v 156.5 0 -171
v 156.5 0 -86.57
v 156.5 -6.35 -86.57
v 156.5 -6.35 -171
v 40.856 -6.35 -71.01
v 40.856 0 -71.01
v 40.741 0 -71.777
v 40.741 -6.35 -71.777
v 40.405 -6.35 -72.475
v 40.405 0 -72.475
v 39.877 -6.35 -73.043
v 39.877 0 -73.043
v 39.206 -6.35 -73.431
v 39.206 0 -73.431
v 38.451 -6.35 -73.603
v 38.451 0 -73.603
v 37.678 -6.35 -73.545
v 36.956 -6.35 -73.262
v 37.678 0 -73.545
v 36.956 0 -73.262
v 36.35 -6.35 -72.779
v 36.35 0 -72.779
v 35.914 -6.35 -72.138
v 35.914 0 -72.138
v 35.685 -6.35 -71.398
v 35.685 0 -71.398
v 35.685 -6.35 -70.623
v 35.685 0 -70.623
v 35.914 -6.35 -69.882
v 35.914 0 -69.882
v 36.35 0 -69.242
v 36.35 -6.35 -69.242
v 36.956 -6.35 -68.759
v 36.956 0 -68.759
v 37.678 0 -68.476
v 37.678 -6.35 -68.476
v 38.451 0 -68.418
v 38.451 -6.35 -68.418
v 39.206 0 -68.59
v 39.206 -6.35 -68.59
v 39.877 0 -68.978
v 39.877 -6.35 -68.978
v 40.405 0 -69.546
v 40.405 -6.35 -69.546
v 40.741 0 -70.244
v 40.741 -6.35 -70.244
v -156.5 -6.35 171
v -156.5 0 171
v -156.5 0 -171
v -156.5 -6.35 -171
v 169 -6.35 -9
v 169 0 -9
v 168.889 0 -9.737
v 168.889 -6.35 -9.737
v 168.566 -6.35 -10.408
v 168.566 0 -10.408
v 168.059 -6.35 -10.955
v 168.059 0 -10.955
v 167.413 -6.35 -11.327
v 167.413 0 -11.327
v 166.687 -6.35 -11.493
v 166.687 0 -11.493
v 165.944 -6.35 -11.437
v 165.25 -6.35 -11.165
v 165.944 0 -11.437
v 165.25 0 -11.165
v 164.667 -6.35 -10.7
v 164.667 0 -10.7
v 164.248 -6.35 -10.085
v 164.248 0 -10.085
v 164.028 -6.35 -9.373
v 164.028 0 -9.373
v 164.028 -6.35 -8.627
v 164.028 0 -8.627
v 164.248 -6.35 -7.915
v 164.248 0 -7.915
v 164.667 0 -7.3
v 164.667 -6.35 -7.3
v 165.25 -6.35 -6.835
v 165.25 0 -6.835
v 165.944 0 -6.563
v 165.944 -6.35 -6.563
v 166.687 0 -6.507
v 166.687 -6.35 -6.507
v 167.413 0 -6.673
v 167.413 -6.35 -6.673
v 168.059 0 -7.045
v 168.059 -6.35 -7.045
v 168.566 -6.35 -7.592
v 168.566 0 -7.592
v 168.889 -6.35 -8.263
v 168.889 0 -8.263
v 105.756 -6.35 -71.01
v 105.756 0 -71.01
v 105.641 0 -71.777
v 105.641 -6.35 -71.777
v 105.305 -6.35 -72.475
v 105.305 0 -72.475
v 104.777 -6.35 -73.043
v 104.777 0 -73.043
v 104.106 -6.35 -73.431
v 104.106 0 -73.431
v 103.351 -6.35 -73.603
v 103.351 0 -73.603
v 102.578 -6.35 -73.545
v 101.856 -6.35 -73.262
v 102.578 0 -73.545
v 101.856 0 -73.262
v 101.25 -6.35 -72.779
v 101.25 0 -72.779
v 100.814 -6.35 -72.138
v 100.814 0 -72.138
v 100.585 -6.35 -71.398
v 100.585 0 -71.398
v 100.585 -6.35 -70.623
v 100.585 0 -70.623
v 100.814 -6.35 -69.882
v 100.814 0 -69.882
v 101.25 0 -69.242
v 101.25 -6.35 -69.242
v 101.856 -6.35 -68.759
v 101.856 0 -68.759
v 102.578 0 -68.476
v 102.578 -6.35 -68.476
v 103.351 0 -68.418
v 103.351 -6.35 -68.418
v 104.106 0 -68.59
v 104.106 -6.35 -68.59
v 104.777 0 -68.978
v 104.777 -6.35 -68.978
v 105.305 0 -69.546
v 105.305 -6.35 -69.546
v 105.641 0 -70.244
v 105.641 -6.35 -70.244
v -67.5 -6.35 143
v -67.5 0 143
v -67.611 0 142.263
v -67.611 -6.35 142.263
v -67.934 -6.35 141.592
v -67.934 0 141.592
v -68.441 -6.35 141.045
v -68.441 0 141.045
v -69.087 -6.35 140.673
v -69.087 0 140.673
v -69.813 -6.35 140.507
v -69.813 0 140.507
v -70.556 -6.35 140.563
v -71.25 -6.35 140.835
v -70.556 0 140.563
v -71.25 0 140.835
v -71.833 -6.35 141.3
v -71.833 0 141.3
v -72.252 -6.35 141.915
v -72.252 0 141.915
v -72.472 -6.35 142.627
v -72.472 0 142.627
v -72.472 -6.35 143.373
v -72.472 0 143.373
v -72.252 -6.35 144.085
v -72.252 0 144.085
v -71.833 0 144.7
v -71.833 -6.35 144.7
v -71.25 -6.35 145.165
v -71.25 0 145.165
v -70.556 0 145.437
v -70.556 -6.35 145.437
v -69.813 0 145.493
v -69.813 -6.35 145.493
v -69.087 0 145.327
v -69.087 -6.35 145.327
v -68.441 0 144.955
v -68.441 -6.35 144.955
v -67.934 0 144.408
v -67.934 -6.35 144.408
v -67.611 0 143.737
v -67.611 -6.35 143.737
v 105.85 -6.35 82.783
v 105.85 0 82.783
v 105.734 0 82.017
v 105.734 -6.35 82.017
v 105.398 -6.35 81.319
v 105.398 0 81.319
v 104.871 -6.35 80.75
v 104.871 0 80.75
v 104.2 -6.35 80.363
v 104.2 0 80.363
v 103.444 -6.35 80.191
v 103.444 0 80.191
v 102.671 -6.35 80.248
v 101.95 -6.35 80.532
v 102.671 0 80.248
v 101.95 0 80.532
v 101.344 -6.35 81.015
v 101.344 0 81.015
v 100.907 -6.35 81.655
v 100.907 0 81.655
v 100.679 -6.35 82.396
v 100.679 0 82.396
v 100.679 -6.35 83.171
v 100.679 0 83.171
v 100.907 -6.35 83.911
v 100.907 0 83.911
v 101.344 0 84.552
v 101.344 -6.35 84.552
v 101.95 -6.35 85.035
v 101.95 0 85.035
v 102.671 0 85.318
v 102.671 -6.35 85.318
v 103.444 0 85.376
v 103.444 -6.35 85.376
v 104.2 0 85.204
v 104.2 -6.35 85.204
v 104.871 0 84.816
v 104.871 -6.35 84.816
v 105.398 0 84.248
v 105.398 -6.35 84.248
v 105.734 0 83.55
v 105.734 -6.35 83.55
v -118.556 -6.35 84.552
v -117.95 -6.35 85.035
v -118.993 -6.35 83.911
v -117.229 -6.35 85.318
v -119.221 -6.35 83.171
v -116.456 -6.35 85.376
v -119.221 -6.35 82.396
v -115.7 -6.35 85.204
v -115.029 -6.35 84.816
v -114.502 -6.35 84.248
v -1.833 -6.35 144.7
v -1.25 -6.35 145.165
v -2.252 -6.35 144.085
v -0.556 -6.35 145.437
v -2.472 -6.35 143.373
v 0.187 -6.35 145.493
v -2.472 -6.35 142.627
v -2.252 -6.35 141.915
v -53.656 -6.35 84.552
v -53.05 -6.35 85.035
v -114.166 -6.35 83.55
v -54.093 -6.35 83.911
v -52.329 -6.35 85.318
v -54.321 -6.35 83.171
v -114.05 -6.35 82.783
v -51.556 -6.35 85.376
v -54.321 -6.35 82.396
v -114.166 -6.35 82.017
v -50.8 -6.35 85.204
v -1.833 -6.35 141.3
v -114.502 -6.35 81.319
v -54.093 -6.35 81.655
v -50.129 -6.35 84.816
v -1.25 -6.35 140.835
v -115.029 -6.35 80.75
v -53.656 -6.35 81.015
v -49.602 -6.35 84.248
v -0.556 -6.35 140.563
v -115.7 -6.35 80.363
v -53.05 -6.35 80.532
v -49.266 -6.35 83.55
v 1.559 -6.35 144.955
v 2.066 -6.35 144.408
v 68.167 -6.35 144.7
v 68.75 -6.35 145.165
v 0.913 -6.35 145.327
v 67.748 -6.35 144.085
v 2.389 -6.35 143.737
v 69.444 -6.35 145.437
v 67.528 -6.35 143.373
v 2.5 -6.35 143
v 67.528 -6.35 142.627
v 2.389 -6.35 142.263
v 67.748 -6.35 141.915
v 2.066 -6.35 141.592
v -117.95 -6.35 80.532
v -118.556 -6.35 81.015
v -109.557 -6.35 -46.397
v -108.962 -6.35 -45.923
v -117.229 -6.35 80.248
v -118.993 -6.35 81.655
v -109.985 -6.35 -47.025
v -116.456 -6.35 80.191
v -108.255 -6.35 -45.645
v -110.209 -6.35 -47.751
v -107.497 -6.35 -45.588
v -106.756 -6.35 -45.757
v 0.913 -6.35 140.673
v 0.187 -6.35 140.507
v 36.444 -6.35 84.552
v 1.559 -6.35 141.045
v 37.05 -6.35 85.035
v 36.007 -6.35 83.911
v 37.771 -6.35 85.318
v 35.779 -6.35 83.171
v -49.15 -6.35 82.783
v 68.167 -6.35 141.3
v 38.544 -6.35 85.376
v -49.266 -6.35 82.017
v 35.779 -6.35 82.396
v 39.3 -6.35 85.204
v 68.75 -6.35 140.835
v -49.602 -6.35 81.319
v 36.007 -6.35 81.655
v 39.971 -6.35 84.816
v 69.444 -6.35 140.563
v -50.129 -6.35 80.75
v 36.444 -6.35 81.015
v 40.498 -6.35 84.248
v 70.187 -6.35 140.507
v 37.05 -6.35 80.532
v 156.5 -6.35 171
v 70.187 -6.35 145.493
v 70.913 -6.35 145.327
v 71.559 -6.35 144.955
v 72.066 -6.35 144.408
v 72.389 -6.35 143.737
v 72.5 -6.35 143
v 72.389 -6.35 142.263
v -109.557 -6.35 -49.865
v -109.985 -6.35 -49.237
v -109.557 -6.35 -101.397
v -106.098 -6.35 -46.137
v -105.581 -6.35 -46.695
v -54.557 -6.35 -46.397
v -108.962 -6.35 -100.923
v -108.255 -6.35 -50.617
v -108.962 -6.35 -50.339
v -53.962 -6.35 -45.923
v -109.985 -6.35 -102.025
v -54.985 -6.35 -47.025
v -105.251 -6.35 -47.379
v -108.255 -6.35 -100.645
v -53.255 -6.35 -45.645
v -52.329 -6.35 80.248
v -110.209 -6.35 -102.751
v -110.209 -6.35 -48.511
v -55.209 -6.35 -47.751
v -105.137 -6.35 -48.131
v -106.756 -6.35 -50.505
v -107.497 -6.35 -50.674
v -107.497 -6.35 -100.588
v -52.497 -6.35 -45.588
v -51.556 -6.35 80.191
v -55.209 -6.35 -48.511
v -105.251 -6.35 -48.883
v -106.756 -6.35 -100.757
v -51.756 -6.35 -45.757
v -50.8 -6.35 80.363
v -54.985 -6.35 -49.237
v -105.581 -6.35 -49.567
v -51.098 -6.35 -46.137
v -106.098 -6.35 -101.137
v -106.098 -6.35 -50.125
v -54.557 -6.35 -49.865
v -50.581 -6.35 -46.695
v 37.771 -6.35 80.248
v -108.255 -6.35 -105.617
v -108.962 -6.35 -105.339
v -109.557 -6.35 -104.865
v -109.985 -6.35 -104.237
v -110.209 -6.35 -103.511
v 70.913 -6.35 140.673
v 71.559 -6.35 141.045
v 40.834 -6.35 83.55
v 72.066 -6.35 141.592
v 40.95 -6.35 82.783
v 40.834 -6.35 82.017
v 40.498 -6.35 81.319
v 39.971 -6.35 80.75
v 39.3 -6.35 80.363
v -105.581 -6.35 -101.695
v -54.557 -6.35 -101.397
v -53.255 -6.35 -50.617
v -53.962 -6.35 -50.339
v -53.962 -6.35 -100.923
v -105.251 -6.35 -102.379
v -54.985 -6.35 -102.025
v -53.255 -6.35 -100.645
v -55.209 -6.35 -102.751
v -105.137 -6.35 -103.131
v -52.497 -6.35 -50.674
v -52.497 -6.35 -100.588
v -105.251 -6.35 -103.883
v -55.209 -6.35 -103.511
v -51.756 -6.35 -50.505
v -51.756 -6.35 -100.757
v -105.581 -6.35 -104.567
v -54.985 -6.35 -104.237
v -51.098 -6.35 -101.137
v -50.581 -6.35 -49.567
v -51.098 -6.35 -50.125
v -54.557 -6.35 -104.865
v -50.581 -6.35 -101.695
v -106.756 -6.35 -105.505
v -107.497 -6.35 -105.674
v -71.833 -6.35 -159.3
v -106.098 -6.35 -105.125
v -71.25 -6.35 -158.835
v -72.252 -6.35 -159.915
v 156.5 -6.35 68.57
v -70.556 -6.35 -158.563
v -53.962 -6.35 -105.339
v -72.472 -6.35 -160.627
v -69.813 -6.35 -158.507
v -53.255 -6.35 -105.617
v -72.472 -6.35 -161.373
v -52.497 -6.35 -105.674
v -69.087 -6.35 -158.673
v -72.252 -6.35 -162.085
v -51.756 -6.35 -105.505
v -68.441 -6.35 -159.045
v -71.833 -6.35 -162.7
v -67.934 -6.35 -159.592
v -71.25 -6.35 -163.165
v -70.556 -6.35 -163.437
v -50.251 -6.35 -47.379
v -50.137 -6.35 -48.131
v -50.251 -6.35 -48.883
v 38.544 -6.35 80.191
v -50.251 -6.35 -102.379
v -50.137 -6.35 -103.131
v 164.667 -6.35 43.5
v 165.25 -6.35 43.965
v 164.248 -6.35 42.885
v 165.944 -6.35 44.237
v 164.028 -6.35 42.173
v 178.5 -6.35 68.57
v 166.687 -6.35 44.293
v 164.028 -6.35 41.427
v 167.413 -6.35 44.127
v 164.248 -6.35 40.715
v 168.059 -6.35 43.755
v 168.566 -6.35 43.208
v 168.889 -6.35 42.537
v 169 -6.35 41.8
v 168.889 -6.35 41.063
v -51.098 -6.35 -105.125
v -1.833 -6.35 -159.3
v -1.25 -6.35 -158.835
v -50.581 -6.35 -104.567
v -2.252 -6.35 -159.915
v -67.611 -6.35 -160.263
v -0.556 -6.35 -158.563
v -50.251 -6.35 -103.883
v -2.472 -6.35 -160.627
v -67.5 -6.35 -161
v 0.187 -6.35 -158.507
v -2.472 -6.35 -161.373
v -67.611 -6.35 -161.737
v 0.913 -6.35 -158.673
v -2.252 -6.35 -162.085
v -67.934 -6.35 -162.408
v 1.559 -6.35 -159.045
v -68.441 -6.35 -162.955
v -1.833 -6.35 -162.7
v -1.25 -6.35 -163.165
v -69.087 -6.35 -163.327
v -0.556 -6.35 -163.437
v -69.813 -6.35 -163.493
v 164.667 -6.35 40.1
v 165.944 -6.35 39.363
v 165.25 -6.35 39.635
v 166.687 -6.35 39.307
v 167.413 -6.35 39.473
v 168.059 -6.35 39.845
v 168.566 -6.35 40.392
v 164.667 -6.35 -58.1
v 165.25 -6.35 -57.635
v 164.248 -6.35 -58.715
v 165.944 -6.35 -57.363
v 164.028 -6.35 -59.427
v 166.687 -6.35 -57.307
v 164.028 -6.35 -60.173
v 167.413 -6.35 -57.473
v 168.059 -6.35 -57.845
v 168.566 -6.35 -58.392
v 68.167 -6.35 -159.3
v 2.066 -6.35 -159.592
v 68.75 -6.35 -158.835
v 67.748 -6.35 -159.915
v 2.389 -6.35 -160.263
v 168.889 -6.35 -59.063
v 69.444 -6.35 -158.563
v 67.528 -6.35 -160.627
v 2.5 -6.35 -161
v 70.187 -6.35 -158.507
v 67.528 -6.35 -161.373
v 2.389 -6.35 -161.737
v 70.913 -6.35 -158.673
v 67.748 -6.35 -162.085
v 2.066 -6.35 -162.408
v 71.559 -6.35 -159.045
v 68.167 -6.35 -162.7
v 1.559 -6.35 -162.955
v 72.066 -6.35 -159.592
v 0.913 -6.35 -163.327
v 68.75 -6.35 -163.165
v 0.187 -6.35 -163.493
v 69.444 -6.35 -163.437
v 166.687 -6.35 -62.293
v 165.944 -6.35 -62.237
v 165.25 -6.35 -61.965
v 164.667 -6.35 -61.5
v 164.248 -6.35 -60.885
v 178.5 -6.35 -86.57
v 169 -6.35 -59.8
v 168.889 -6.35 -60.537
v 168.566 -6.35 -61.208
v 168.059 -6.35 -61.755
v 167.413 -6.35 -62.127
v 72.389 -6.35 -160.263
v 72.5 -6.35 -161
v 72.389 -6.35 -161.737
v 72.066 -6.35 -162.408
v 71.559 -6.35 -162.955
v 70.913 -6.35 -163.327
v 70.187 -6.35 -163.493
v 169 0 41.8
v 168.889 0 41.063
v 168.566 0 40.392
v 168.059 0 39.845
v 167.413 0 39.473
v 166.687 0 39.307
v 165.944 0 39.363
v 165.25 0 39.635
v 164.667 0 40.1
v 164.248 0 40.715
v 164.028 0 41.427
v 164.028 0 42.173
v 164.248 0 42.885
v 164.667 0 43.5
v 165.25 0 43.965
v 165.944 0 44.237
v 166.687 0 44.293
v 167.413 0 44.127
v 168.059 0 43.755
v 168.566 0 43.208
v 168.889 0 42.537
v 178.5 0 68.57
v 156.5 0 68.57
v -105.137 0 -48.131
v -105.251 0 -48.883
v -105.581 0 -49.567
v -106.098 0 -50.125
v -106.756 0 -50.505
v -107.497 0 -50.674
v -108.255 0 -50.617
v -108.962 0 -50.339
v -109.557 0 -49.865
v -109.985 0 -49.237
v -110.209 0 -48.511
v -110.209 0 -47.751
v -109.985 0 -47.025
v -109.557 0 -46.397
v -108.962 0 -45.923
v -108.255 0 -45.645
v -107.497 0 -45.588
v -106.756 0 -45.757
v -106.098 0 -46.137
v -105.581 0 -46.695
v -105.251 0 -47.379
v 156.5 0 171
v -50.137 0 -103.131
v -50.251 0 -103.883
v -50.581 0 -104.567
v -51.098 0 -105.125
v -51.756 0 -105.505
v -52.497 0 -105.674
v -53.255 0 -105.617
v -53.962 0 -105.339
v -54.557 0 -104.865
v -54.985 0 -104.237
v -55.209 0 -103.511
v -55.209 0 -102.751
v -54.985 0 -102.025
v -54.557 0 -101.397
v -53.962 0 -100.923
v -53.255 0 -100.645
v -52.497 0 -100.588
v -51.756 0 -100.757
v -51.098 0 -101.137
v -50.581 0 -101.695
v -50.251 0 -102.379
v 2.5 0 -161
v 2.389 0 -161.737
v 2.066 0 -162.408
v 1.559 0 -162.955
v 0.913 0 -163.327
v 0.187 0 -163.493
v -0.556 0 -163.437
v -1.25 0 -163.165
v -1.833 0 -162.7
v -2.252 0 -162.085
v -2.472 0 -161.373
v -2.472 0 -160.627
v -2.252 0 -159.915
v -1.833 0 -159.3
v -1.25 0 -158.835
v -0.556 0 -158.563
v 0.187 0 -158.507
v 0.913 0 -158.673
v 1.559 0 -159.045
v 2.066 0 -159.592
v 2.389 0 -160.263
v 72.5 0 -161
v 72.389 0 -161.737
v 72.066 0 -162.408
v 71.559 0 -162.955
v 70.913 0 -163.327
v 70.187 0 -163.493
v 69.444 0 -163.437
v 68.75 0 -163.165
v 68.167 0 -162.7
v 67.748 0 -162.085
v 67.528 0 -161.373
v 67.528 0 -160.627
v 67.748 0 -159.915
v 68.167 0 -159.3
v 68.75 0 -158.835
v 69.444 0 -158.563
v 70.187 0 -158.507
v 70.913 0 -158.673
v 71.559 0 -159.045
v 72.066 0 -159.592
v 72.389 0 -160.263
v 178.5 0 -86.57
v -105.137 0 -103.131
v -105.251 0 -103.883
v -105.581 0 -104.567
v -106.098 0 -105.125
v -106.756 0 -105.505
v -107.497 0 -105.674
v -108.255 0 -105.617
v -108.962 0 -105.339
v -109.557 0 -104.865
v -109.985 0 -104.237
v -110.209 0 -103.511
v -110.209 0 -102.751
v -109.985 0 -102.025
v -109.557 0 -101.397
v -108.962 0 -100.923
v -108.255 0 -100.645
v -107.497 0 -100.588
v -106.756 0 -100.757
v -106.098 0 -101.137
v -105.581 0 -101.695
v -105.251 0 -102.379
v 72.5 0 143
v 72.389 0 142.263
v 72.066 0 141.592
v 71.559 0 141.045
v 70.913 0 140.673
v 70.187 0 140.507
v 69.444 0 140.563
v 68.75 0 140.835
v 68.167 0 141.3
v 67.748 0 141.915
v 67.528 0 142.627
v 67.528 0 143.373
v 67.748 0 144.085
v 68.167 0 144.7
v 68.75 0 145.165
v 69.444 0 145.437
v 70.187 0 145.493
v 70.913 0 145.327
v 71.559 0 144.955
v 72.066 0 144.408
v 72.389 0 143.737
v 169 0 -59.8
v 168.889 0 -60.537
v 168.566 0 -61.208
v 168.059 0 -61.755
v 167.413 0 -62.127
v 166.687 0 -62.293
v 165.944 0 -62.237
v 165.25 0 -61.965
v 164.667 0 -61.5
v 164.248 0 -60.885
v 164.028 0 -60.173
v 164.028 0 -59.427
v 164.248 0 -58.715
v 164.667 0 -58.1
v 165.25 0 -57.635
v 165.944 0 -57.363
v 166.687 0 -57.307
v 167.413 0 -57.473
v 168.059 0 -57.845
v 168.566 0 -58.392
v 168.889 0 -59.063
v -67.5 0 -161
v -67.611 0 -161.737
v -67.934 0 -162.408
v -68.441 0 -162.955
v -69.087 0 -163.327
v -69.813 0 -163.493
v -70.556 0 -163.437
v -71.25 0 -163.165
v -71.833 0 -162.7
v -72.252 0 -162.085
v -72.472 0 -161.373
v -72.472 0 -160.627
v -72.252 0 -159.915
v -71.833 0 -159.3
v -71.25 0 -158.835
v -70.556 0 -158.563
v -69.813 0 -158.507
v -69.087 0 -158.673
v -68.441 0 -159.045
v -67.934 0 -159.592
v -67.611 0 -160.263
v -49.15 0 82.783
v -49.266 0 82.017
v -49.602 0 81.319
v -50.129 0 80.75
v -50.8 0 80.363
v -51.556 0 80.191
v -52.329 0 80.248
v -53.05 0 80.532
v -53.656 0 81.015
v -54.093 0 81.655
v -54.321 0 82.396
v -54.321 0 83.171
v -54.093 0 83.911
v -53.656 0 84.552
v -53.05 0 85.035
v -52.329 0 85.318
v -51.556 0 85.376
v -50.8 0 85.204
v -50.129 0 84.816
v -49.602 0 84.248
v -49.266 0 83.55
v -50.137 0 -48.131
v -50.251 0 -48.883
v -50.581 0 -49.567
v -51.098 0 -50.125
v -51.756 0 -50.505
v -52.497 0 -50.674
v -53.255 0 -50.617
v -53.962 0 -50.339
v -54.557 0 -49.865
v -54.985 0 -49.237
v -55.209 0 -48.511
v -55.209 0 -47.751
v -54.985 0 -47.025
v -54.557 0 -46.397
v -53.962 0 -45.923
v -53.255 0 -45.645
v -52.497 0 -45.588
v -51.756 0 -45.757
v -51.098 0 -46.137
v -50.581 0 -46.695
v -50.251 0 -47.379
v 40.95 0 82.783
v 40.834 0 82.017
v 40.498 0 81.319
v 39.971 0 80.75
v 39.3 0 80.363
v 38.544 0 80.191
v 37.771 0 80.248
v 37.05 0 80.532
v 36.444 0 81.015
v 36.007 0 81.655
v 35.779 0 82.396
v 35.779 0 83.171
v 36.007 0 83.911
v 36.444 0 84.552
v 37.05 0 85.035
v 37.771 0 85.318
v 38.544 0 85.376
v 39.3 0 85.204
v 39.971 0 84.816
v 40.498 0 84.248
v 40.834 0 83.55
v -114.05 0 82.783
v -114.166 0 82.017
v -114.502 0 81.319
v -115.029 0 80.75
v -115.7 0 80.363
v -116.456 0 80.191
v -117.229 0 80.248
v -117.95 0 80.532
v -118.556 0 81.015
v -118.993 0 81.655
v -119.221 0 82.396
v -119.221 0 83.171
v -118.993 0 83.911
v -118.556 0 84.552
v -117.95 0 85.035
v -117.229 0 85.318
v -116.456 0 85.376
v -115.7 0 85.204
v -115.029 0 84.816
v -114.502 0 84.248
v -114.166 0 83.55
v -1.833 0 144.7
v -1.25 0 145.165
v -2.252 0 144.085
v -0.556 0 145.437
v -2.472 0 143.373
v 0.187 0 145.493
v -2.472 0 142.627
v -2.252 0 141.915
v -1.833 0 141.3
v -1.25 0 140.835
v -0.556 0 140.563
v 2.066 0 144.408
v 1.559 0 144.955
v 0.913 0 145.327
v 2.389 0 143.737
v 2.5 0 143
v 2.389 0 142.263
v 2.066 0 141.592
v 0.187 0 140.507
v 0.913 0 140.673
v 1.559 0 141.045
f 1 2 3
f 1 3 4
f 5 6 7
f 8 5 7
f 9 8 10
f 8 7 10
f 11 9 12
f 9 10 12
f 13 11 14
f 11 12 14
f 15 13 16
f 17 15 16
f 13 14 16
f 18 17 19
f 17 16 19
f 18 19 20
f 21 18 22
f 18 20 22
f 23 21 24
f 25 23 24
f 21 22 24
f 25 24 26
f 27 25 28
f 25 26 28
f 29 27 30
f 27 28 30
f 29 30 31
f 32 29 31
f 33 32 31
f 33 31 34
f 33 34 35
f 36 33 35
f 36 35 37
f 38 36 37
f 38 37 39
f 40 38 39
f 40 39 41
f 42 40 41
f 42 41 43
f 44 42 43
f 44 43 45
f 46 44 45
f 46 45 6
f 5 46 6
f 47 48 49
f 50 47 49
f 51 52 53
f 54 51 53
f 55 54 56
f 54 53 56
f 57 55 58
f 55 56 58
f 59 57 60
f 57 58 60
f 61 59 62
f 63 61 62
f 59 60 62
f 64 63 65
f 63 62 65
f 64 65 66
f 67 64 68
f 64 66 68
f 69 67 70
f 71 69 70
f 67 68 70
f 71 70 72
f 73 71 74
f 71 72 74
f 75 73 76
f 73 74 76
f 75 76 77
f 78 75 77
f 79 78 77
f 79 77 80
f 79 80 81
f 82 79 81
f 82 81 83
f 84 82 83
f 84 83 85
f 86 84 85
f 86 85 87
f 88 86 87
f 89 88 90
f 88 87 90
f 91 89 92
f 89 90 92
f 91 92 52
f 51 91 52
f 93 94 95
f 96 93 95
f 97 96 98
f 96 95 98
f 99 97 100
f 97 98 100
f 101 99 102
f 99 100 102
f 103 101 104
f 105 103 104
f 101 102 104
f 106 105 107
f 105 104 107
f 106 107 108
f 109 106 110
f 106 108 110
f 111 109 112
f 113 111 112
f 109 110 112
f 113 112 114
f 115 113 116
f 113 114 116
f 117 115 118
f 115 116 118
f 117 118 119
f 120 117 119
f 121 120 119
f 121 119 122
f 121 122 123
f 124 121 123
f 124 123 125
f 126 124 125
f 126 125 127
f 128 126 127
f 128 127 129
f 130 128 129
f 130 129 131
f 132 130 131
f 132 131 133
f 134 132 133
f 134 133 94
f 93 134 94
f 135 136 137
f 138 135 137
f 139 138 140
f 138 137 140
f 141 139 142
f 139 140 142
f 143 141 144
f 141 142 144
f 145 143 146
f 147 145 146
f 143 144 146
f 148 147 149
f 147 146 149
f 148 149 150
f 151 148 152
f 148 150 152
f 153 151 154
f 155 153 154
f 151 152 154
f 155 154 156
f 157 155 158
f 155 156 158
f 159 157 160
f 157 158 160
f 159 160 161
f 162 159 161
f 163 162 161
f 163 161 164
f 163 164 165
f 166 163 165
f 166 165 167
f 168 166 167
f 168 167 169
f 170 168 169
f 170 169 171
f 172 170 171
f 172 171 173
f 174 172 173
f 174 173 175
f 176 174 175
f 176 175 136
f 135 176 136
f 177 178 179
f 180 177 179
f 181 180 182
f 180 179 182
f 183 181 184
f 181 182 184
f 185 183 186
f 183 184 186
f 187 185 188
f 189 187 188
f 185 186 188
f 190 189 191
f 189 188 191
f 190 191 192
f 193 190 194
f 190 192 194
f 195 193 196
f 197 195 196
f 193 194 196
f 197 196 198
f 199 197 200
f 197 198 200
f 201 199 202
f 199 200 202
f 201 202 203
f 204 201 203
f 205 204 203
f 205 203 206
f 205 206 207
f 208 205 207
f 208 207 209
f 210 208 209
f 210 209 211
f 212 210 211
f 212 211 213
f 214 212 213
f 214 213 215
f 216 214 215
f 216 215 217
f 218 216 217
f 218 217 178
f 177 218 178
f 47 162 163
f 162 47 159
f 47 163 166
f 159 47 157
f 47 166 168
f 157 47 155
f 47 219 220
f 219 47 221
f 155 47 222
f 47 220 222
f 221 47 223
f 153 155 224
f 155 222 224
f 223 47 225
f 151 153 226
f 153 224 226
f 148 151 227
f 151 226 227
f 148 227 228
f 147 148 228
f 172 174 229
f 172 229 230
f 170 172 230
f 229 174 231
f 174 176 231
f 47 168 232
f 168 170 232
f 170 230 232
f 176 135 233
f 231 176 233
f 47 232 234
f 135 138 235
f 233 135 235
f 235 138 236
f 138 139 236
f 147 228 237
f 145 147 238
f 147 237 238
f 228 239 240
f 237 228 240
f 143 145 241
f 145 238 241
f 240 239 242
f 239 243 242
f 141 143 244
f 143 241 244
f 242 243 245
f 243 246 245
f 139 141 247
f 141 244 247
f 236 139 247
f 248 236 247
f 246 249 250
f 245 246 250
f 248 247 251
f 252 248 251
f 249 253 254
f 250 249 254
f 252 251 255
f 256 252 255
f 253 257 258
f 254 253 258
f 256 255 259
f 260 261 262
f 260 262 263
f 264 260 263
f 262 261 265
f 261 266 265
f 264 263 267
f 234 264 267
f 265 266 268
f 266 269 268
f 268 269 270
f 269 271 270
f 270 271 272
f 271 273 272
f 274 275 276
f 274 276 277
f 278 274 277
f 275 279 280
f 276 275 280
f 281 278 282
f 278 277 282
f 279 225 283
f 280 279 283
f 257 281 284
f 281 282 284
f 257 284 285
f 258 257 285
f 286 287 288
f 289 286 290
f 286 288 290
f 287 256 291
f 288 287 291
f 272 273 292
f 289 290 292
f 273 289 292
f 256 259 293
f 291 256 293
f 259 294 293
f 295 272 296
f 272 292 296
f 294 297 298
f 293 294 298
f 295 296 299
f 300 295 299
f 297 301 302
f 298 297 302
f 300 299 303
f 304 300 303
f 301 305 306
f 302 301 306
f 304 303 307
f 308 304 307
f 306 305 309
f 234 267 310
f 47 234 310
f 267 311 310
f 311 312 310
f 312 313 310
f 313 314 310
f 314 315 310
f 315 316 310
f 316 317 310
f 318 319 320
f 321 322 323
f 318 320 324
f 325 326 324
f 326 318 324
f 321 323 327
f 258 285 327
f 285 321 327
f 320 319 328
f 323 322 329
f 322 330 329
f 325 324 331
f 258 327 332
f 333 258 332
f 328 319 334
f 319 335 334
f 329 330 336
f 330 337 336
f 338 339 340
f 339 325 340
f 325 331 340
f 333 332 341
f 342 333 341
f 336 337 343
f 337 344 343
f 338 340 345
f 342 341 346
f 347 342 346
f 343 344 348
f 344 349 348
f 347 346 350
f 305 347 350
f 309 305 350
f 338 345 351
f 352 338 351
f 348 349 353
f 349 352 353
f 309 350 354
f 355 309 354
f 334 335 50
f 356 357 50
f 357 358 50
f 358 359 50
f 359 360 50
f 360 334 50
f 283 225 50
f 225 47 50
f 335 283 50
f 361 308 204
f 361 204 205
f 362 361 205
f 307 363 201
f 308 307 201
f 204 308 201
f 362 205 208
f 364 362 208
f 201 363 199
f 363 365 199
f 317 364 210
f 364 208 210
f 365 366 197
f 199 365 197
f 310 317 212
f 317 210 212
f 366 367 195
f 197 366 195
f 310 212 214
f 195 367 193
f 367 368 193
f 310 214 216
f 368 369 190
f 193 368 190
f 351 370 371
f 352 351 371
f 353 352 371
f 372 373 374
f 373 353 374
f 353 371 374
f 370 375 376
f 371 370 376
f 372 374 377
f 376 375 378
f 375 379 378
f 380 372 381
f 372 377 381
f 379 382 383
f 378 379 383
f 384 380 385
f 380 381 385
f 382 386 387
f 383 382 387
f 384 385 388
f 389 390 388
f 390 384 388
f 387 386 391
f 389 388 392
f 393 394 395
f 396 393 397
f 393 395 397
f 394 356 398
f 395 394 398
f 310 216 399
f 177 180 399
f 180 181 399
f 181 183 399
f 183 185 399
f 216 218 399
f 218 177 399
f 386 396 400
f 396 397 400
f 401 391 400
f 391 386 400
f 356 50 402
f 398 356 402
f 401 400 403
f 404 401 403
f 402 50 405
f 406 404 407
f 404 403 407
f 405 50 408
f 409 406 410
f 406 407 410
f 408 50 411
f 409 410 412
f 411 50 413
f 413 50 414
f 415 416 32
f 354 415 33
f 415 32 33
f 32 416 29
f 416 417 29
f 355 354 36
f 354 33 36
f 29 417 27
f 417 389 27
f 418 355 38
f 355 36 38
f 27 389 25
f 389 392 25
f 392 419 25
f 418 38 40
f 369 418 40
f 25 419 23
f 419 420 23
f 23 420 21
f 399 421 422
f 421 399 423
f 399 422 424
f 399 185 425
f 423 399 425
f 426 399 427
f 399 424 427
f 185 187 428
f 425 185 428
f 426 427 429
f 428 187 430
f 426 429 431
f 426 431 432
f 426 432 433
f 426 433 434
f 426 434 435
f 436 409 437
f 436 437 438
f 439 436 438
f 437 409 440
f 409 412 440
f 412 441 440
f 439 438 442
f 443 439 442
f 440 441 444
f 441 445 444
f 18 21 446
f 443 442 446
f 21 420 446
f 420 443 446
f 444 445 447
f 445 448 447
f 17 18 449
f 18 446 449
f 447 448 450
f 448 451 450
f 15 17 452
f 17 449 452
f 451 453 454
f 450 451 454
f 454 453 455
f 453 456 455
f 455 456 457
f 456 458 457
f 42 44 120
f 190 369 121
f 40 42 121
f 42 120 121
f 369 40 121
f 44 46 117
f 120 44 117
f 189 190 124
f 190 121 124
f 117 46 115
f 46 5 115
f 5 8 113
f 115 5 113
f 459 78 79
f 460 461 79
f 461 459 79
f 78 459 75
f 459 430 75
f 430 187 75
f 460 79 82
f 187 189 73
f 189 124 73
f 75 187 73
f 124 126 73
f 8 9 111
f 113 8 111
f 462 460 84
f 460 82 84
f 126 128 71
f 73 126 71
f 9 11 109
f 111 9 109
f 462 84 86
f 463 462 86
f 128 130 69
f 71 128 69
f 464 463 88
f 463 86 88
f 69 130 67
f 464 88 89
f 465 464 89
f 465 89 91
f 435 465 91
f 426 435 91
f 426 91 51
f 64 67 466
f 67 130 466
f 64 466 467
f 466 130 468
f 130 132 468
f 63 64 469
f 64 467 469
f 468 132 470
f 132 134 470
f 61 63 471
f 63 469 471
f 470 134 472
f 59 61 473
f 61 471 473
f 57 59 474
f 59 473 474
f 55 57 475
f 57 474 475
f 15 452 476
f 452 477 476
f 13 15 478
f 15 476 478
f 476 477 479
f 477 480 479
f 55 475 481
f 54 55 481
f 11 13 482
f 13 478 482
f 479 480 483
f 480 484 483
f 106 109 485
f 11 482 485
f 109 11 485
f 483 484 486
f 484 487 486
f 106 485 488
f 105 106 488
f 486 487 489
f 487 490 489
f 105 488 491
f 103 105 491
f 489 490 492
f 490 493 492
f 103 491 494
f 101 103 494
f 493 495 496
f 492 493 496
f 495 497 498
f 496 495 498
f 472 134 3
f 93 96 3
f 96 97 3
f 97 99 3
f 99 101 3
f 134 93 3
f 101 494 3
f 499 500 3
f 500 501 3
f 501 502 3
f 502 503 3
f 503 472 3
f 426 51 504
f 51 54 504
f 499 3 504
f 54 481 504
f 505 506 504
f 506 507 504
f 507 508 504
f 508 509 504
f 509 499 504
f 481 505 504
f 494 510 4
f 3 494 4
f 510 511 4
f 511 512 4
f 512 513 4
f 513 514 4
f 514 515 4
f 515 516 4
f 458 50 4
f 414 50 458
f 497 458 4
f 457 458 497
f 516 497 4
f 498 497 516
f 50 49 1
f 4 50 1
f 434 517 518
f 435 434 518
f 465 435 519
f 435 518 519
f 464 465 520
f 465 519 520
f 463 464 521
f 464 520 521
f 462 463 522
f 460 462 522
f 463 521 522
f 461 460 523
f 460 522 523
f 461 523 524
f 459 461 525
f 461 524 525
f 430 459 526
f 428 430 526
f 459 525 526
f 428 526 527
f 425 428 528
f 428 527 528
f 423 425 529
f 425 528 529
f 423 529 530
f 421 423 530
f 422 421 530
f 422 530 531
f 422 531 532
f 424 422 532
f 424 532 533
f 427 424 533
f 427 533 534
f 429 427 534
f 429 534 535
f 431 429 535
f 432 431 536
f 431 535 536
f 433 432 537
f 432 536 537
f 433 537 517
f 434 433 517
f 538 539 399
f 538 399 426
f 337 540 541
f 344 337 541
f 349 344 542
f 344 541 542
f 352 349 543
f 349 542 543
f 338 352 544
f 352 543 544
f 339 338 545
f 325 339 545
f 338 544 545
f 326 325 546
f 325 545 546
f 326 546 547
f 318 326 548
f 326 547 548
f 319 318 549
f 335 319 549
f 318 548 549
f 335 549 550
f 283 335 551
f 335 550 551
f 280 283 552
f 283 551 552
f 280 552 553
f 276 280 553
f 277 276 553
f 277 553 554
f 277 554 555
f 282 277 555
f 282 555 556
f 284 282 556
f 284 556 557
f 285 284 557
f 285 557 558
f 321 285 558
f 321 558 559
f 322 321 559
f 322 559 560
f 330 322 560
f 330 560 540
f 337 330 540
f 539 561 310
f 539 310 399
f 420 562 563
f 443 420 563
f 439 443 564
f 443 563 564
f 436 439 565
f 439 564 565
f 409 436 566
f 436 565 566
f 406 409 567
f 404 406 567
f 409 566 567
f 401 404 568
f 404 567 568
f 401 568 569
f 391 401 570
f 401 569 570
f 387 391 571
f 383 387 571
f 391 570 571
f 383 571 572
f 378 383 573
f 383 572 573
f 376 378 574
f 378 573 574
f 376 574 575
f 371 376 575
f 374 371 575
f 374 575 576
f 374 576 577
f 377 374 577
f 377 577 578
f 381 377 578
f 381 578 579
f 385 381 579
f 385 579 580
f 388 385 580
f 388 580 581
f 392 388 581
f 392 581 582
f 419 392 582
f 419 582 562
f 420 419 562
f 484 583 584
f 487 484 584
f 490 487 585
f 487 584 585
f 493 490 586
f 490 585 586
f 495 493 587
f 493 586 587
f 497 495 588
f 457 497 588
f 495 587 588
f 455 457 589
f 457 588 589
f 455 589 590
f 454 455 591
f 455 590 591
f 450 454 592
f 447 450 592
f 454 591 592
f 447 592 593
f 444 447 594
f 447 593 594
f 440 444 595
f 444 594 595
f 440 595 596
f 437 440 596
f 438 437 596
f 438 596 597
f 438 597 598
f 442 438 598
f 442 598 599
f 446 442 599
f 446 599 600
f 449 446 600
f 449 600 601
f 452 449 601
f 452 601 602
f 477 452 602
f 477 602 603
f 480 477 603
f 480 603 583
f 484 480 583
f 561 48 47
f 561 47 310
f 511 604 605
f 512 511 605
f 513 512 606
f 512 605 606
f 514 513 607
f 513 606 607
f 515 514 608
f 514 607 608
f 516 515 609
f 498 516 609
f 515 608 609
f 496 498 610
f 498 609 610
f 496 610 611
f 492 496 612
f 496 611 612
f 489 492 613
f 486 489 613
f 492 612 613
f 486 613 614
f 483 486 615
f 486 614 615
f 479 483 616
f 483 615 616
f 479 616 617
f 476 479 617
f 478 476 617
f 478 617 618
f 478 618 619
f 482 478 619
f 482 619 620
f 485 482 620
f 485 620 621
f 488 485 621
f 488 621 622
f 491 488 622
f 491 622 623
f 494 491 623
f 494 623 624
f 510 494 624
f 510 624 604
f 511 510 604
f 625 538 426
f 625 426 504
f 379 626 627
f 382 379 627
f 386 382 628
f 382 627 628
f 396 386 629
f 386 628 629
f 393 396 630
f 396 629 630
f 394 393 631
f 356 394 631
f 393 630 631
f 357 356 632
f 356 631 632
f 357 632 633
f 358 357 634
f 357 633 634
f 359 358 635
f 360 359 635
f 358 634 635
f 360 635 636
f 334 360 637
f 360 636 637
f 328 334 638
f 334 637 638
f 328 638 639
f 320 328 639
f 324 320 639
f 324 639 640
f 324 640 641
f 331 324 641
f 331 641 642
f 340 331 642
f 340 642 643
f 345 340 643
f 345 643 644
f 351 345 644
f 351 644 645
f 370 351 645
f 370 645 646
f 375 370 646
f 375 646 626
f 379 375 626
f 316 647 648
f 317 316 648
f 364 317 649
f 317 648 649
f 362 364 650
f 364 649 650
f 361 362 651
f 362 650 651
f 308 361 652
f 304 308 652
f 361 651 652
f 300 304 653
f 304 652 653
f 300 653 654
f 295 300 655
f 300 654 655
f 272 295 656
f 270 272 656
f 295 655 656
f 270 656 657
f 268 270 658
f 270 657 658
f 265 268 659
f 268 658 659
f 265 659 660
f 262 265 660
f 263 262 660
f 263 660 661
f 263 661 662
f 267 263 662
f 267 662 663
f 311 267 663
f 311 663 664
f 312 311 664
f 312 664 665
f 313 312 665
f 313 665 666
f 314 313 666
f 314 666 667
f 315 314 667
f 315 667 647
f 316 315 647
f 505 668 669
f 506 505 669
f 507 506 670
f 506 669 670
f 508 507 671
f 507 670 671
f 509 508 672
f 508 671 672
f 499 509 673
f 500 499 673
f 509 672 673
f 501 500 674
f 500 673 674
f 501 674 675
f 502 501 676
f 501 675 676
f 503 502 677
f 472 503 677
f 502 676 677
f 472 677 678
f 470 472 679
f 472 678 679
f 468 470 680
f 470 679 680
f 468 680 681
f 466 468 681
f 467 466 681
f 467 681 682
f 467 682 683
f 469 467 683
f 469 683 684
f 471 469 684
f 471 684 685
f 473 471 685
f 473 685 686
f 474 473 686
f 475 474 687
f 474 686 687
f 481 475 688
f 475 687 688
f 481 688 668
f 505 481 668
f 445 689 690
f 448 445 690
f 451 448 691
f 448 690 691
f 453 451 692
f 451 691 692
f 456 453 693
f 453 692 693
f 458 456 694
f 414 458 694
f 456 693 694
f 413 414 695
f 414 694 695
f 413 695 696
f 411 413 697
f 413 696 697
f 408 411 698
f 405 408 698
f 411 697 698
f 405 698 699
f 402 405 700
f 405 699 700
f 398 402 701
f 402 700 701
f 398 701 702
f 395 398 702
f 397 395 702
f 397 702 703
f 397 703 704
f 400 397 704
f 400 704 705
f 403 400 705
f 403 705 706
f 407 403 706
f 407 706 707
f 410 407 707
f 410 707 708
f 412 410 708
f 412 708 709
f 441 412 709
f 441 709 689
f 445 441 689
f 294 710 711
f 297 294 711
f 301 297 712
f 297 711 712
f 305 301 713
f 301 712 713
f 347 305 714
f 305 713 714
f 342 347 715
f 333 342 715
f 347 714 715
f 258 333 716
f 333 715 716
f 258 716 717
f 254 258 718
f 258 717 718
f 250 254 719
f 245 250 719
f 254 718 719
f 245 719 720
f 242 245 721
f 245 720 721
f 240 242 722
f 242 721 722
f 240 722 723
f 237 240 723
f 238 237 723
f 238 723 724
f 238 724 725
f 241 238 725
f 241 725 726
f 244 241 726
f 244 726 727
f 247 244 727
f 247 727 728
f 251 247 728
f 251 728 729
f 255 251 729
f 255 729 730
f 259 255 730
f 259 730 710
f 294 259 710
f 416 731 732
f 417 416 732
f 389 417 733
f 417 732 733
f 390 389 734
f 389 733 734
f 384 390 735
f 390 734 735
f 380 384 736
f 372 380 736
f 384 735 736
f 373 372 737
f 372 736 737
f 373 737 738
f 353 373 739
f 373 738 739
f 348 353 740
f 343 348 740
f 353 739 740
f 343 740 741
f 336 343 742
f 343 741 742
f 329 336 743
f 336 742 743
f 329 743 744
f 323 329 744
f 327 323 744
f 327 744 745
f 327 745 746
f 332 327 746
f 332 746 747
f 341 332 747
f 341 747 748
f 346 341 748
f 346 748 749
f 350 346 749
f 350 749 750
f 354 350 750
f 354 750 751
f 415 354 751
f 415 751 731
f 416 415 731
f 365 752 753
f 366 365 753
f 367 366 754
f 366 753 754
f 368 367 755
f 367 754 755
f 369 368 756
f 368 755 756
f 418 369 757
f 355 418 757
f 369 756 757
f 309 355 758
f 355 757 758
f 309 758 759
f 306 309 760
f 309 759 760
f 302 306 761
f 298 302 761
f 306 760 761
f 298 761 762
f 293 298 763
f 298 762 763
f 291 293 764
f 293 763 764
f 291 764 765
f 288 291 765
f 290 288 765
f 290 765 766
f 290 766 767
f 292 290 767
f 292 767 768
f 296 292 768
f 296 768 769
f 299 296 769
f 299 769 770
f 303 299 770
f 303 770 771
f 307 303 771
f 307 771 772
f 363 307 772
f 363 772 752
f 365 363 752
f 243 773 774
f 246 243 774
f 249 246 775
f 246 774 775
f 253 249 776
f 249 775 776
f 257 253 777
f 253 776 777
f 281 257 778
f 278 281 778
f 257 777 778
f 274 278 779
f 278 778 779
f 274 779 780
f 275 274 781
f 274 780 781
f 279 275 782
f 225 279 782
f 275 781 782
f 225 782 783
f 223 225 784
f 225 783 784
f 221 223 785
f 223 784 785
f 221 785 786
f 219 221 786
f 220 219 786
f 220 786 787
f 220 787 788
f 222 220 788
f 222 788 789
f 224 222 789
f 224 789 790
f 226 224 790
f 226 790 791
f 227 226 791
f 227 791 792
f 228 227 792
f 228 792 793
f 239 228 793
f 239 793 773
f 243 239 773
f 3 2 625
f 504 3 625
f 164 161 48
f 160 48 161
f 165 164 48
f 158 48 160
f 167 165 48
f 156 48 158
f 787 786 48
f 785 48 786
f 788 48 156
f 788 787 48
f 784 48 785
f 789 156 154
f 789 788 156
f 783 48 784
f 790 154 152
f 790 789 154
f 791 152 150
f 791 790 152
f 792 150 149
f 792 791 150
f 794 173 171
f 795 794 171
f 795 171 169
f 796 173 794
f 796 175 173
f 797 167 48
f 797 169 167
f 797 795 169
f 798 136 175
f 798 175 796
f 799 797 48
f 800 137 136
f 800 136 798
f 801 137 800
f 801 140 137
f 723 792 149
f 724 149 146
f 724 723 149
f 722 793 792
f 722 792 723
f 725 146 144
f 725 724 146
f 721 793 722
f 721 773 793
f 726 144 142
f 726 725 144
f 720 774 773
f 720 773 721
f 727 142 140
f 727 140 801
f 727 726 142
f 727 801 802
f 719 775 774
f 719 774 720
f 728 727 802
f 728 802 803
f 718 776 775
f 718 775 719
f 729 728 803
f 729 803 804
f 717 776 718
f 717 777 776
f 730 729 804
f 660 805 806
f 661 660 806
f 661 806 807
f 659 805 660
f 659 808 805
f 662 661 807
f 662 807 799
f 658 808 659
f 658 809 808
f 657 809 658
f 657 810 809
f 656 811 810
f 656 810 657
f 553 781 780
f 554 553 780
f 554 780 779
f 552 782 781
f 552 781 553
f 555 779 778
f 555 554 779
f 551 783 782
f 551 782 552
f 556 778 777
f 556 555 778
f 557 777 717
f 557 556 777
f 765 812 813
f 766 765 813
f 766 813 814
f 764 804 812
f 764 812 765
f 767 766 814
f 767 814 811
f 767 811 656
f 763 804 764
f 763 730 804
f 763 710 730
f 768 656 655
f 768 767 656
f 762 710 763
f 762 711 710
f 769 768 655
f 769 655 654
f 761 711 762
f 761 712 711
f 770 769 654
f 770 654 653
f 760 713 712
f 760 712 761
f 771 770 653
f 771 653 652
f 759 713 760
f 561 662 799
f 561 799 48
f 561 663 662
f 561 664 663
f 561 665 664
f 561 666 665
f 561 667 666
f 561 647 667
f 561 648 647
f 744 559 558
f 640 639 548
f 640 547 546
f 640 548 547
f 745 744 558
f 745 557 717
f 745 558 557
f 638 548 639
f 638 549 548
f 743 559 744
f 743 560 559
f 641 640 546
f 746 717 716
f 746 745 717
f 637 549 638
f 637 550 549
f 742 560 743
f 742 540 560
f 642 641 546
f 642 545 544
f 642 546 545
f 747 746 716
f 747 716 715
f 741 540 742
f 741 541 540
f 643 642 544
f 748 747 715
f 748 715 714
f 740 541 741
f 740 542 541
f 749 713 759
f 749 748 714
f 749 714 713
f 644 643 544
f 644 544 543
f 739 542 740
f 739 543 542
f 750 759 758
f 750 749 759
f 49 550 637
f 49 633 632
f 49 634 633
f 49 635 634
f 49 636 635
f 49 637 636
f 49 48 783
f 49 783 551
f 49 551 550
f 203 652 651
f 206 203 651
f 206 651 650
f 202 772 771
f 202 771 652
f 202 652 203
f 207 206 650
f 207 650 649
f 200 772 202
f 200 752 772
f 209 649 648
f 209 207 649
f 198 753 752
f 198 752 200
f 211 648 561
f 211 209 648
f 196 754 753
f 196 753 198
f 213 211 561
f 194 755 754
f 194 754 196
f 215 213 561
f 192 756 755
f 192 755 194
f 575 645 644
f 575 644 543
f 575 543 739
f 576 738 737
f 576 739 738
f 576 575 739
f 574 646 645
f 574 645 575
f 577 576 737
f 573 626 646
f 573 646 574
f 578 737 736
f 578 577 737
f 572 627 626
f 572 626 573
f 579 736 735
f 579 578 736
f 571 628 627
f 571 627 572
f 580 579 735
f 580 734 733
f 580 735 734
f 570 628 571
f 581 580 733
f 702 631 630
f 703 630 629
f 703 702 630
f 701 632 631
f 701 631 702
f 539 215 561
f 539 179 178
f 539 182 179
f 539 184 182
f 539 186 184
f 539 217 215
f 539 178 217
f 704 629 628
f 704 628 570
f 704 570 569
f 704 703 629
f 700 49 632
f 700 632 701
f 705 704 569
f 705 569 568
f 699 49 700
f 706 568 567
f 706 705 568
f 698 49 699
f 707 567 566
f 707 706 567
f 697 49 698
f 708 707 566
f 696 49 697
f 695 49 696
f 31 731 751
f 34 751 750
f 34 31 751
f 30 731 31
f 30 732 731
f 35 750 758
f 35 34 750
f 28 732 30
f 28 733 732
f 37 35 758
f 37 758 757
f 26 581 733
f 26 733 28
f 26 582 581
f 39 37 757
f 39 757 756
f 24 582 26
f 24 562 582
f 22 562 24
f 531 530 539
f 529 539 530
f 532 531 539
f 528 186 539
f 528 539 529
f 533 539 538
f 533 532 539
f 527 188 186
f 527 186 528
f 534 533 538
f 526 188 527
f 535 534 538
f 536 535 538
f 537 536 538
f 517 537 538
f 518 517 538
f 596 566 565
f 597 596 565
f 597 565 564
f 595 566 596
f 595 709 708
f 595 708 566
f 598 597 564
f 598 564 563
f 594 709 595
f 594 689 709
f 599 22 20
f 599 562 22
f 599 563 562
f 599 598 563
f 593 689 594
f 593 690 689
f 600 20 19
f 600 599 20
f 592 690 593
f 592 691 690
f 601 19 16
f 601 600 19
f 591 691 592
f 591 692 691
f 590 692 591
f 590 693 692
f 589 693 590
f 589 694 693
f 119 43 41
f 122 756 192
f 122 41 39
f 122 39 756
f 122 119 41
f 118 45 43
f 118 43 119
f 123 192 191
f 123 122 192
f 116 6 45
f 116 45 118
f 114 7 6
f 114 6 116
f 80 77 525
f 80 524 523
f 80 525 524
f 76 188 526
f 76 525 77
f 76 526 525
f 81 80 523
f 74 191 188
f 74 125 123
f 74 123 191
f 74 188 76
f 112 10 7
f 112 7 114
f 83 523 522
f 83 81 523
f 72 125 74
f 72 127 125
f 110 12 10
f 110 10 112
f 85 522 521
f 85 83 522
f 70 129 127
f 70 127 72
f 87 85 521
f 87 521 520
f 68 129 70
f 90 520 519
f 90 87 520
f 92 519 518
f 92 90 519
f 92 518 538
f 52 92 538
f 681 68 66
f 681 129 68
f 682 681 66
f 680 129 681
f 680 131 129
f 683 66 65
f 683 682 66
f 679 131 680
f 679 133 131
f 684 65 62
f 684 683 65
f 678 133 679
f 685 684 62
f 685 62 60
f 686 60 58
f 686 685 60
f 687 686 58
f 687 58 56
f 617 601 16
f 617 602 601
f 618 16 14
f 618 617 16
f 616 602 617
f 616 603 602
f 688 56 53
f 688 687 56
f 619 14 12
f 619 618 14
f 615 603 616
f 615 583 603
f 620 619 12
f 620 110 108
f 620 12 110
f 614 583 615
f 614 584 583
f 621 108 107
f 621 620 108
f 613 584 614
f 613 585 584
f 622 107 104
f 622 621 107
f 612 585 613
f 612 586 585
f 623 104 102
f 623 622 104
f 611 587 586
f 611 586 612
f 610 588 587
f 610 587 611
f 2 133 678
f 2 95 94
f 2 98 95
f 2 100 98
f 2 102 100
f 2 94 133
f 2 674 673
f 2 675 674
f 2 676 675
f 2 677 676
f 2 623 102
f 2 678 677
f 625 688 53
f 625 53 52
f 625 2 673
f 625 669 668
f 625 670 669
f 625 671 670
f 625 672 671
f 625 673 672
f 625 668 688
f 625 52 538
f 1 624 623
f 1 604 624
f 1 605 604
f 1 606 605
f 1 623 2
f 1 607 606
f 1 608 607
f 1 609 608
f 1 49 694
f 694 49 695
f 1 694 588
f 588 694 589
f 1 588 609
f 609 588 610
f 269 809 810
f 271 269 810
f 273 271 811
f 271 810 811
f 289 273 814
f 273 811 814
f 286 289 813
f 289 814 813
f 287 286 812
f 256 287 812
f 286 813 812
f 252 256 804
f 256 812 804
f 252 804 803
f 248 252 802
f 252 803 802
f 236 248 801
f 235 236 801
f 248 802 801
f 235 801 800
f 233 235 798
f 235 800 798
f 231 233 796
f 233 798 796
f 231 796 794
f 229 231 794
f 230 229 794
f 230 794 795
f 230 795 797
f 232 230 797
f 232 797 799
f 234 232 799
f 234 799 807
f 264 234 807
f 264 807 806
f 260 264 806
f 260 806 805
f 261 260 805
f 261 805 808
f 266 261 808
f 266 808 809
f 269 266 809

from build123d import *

# Parameters (mm, degrees)
SKETCH1_W           = 313
SKETCH1_H           = 342
BOSS_EXTRUDE1_DEPTH = 6.35
SKETCH3_W           = 22
SKETCH3_H           = 155.14040353
SKETCH3_R           = 2.5
BOSS_EXTRUDE2_DEPTH = 6.35
SKETCH2_R           = 2.5
CUT_EXTRUDE1_DEPTH  = 7.35
SKETCH4_R           = 2.6
SKETCH4_R_2         = 2.55
CUT_EXTRUDE2_DEPTH  = 7.35


with BuildPart() as part:
    # Sketch1 → Boss-Extrude1 (new body)
    with BuildSketch(Plane(origin=(0, 0, 0), x_dir=(1, 0, 0), z_dir=(0, 1, 0))):
        Rectangle(SKETCH1_W, SKETCH1_H)
    extrude(amount=-BOSS_EXTRUDE1_DEPTH)

    # Sketch3 → Boss-Extrude2 (add)
    with BuildSketch(Plane(origin=(0, 0, 0), x_dir=(1, 0, 0), z_dir=(0, 1, 0))):
        with Locations((167.5, 9)):
            Rectangle(SKETCH3_W, SKETCH3_H)
        with Locations((166.5, 9)):
            Circle(SKETCH3_R, mode=Mode.SUBTRACT)
        with Locations((166.5, -41.8)):
            Circle(SKETCH3_R, mode=Mode.SUBTRACT)
        with Locations((166.5, 59.8)):
            Circle(SKETCH3_R, mode=Mode.SUBTRACT)
    extrude(amount=-BOSS_EXTRUDE2_DEPTH)

    # Sketch2 → Cut-Extrude1 (cut, through all)
    with BuildSketch(Plane(origin=(0, 0, 0), x_dir=(1, 0, 0), z_dir=(0, 1, 0))):
        with Locations((0, -143)):
            Circle(SKETCH2_R)
        with Locations((-70, -143)):
            Circle(SKETCH2_R)
        with Locations((70, -143)):
            Circle(SKETCH2_R)
        with Locations((-70, 161)):
            Circle(SKETCH2_R)
        with Locations((0, 161)):
            Circle(SKETCH2_R)
        with Locations((70, 161)):
            Circle(SKETCH2_R)
    extrude(amount=-CUT_EXTRUDE1_DEPTH, mode=Mode.SUBTRACT)

    # Sketch4 → Cut-Extrude2 (cut, through all)
    with BuildSketch(Plane(origin=(0, 0, 0), x_dir=(1, 0, 0), z_dir=(0, 1, 0))):
        with Locations((103.249710043, -82.783250091)):
            Circle(SKETCH4_R)
        with Locations((38.349710043, -82.783250091)):
            Circle(SKETCH4_R)
        with Locations((-51.750289957, -82.783250091)):
            Circle(SKETCH4_R)
        with Locations((-116.650289957, -82.783250091)):
            Circle(SKETCH4_R)
        with Locations((103.156346537, 71.010318364)):
            Circle(SKETCH4_R)
        with Locations((38.256346537, 71.010318364)):
            Circle(SKETCH4_R)
        with Locations((-52.687463488, 48.130966948)):
            Circle(SKETCH4_R_2)
        with Locations((-107.687463488, 48.130966948)):
            Circle(SKETCH4_R_2)
        with Locations((-52.687463488, 103.130966948)):
            Circle(SKETCH4_R_2)
        with Locations((-107.687463488, 103.130966948)):
            Circle(SKETCH4_R_2)
    extrude(amount=-CUT_EXTRUDE2_DEPTH, mode=Mode.SUBTRACT)


solid = part.part
